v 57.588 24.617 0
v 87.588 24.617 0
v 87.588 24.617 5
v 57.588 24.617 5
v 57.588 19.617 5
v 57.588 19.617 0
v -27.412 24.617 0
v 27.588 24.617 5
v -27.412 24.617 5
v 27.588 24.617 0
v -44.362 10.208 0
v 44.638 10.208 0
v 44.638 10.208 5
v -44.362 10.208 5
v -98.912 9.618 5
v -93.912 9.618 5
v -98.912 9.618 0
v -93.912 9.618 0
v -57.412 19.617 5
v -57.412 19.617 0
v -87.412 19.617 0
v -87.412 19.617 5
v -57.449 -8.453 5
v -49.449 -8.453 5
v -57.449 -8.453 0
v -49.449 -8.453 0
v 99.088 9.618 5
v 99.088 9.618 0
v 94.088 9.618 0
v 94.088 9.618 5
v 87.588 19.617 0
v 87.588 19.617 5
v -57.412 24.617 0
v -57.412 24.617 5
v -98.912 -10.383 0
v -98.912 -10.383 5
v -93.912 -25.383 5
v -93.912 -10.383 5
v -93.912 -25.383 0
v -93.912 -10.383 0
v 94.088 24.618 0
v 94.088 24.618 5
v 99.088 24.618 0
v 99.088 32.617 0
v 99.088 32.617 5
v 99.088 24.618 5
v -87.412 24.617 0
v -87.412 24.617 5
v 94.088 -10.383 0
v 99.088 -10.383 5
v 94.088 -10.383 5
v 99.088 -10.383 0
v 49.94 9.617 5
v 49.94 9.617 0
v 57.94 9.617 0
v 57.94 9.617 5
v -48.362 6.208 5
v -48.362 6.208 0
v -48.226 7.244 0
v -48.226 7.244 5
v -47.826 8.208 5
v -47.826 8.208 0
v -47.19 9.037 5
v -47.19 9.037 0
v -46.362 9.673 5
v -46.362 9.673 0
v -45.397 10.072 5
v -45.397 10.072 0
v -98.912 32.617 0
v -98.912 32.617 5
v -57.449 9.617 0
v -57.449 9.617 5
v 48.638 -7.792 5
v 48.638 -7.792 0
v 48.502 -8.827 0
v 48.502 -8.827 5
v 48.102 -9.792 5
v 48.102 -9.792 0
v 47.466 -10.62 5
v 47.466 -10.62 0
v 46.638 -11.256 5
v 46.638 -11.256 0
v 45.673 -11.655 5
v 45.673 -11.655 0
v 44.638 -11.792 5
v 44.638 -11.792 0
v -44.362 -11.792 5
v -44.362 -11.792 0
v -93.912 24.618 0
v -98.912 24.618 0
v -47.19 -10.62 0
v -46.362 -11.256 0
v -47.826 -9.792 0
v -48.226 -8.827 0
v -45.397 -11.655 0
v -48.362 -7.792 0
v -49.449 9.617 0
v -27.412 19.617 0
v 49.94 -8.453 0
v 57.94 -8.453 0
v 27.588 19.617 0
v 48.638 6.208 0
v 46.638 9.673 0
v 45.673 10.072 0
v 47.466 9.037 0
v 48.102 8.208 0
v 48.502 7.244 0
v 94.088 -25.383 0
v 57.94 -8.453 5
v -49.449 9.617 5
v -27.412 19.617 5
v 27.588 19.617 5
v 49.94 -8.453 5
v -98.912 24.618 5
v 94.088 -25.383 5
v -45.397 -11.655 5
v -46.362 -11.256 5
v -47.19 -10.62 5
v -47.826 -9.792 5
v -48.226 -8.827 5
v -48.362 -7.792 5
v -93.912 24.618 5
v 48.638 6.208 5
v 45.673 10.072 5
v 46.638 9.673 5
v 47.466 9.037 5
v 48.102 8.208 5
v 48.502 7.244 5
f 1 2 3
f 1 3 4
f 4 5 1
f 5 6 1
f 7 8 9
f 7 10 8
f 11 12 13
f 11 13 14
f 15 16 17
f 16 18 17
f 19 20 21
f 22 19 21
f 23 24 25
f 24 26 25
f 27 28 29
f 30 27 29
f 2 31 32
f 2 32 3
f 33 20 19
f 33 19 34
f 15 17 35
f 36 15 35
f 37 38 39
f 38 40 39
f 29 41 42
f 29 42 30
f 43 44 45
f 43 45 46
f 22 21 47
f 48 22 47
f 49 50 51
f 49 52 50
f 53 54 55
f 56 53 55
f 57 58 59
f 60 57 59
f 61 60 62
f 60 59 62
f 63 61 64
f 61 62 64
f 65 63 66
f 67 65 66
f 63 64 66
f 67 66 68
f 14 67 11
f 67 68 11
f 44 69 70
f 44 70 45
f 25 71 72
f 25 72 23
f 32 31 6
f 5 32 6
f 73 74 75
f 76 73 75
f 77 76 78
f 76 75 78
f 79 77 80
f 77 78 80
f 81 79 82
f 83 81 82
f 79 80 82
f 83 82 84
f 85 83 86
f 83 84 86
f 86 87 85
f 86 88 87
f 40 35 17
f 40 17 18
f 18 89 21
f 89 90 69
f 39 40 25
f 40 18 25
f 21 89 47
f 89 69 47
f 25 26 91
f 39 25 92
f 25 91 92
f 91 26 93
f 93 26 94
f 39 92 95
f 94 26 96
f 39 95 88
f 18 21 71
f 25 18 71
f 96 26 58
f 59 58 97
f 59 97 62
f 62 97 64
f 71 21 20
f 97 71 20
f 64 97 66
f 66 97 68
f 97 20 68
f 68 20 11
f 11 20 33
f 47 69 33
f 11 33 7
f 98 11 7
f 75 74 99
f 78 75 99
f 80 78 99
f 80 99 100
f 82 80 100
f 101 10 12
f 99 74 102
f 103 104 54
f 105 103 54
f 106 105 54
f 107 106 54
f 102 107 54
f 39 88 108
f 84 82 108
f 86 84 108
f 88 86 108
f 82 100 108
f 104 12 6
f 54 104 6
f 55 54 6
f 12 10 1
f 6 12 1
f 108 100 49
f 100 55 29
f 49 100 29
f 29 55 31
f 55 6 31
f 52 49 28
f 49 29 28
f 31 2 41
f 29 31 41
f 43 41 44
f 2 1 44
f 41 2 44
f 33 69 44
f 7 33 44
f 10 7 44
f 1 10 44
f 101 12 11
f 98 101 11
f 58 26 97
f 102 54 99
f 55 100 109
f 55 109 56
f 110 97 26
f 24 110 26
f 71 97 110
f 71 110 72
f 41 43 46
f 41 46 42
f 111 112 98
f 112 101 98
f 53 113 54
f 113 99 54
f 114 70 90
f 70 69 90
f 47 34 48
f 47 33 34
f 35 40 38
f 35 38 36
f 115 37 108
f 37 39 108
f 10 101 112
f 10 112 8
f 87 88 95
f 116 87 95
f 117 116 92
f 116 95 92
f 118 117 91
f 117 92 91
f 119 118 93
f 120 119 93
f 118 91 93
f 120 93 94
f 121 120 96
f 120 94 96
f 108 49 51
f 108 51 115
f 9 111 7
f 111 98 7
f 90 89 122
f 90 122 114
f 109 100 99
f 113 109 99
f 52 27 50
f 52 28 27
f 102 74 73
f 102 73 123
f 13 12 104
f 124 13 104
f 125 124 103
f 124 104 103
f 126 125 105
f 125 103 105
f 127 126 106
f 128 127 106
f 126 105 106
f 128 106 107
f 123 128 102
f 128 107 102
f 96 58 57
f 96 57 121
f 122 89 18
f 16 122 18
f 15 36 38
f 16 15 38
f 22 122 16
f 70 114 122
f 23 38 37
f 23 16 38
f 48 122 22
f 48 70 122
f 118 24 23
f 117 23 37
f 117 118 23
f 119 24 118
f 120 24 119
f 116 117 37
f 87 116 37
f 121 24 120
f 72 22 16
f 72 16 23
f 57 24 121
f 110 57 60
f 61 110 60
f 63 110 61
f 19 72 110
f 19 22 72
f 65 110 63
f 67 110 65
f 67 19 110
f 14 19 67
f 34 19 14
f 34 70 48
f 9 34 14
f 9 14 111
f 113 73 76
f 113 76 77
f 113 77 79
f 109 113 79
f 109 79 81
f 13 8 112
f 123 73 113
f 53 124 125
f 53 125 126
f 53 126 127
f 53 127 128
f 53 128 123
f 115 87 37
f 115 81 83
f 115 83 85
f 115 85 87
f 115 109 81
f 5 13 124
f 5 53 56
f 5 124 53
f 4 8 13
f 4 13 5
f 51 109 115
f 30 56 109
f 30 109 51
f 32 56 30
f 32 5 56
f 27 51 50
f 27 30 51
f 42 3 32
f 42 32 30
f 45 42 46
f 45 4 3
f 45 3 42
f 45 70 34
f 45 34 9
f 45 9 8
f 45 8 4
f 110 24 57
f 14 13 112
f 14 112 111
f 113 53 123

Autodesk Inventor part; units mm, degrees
ref_plane "YZ Plane" through (0, 0, 0) normal (1, 0, 0) x (0, 1, 0)
ref_plane "XZ Plane" through (0, 0, 0) normal (0, 1, 0) x (-1, 0, 0)
ref_plane "XY Plane" through (0, 0, 0) normal (0, 0, 1) x (1, 0, 0)
sketch "Sketch1" plane through (0, 0, 0) normal (0, 0, 1) x (1, 0, 0)
  line L0 (49.9396, 9.6174) -> (57.9396, 9.6174)
  line L1 (57.9396, -8.4526) -> (49.9396, -8.4526)
  line L2 (49.9396, -8.4526) -> (49.9396, 9.6174)
  line L3 (57.9396, -8.4526) -> (57.9396, 9.6174)
  line L4 (-49.449, 9.6174) -> (-49.449, -8.4526)
  line L5 (-49.449, -8.4526) -> (-57.449, -8.4526)
  line L6 (-57.449, 9.6174) -> (-57.449, -8.4526)
  line L7 (-45.5464, 0.7392) -> (-34.5464, 0.7392)
  line L8 (-33.5464, 1.7392) -> (-33.5464, 6.2392)
  line L9 (-34.5464, 7.2392) -> (-45.5464, 7.2392)
  line L10 (-46.5464, 6.2392) -> (-46.5464, 1.7392)
  line L11 (-30.5291, -2.0275) -> (3.4709, -2.0275)
  line L12 (4.4709, -1.0275) -> (4.4709, 3.9725)
  line L13 (-31.5291, 3.9725) -> (-31.5291, -1.0275)
  circle A0 centre (-88.9996, -15.383) radius 1.5
  circle A1 centre (-64.9996, -15.383) radius 1.5
  circle A2 centre (-64.9996, 8.617) radius 1.5
  circle A3 centre (-88.9996, 8.617) radius 1.5
  arc A4 (-82.1595, 3.0543) -> (-82.1595, -9.8202) centre (-76.9996, -3.383) ccw
  arc A5 (-79.9944, -11.0702) -> (-68.8448, -4.633) centre (-76.9996, -3.383) ccw
  arc A6 (-68.8448, -2.133) -> (-79.9944, 4.3043) centre (-76.9996, -3.383) ccw
  arc A7 (-82.0034, -16.8856) -> (-62.804, -5.8009) centre (-76.9996, -3.383) ccw
  arc A8 (-63.7898, -2.133) -> (-62.804, -0.9651) centre (-63.7898, -1.133) ccw
  arc A9 (-62.804, -0.9651) -> (-82.0034, 10.1197) centre (-76.9996, -3.383) ccw
  arc A10 (-82.0034, 10.1197) -> (-82.5219, 8.682) centre (-81.6559, 9.182) ccw
  line L14 (-82.5219, 8.682) -> (-79.9944, 4.3043)
  line L15 (-82.1595, 3.0543) -> (-84.687, 7.432)
  arc A11 (-84.687, 7.432) -> (-86.1913, 7.7018) centre (-85.553, 6.932) ccw
  arc A12 (-86.1913, 7.7018) -> (-86.1913, -14.4677) centre (-76.9996, -3.383) ccw
  arc A13 (-86.1913, -14.4677) -> (-84.687, -14.1979) centre (-85.553, -13.6979) ccw
  line L16 (-84.687, -14.1979) -> (-82.1595, -9.8202)
  arc A14 (-82.5219, -15.4479) -> (-82.0034, -16.8856) centre (-81.6559, -15.9479) ccw
  line L17 (-79.9944, -11.0702) -> (-82.5219, -15.4479)
  line L18 (-63.7898, -4.633) -> (-68.8448, -4.633)
  arc A15 (-62.804, -5.8009) -> (-63.7898, -4.633) centre (-63.7898, -5.633) ccw
  line L19 (-68.8448, -2.133) -> (-63.7898, -2.133)
  circle A16 centre (64.9975, -15.3839) radius 1.5
  circle A17 centre (88.9975, -15.3839) radius 1.5
  circle A18 centre (88.9975, 8.6161) radius 1.5
  circle A19 centre (64.9975, 8.6161) radius 1.5
  line L20 (71.4751, 8.6811) -> (74.0026, 4.3033)
  arc A20 (71.9936, 10.1188) -> (71.4751, 8.6811) centre (72.3411, 9.1811) ccw
  arc A21 (91.193, -0.966) -> (71.9936, 10.1188) centre (76.9975, -3.3839) ccw
  arc A22 (85.1522, -2.1339) -> (74.0026, 4.3033) centre (76.9975, -3.3839) ccw
  line L21 (85.1522, -2.1339) -> (90.2072, -2.1339)
  arc A23 (90.2072, -2.1339) -> (91.193, -0.966) centre (90.2072, -1.1339) ccw
  arc A24 (91.193, -5.8018) -> (90.2072, -4.6339) centre (90.2072, -5.6339) ccw
  arc A25 (71.9936, -16.8866) -> (91.193, -5.8018) centre (76.9975, -3.3839) ccw
  arc A26 (74.0026, -11.0711) -> (85.1522, -4.6339) centre (76.9975, -3.3839) ccw
  line L22 (74.0026, -11.0711) -> (71.4751, -15.4489)
  line L23 (69.31, -14.1989) -> (71.8375, -9.8211)
  arc A27 (67.8057, -14.4686) -> (69.31, -14.1989) centre (68.444, -13.6989) ccw
  arc A28 (67.8057, 7.7009) -> (67.8057, -14.4686) centre (76.9975, -3.3839) ccw
  arc A29 (71.8375, 3.0533) -> (71.8375, -9.8211) centre (76.9975, -3.3839) ccw
  line L24 (71.8375, 3.0533) -> (69.31, 7.4311)
  arc A30 (69.31, 7.4311) -> (67.8057, 7.7009) centre (68.444, 6.9311) ccw
  arc A31 (71.4751, -15.4489) -> (71.9936, -16.8866) centre (72.3411, -15.9489) ccw
  line L25 (90.2072, -4.6339) -> (85.1522, -4.6339)
  line L26 (-49.449, 9.6174) -> (-57.449, 9.6174)
  line L27 (3.4709, 4.9725) -> (-30.5291, 4.9725)
  arc A32 (-34.5464, 0.7392) -> (-33.5464, 1.7392) centre (-34.5464, 1.7392) ccw
  arc A33 (-33.5464, 6.2392) -> (-34.5464, 7.2392) centre (-34.5464, 6.2392) ccw
  arc A34 (-45.5464, 7.2392) -> (-46.5464, 6.2392) centre (-45.5464, 6.2392) ccw
  arc A35 (-46.5464, 1.7392) -> (-45.5464, 0.7392) centre (-45.5464, 1.7392) ccw
  arc A36 (-31.5291, -1.0275) -> (-30.5291, -2.0275) centre (-30.5291, -1.0275) ccw
  arc A37 (-30.5291, 4.9725) -> (-31.5291, 3.9725) centre (-30.5291, 3.9725) ccw
  arc A38 (4.4709, 3.9725) -> (3.4709, 4.9725) centre (3.4709, 3.9725) ccw
  arc A39 (3.4709, -2.0275) -> (4.4709, -1.0275) centre (3.4709, -1.0275) ccw
  line L28 (-57.412, 19.6174) -> (-87.412, 19.6174) projected
  line L29 (-87.412, 19.6174) -> (-87.412, 24.6174) projected
  line L30 (-57.412, 24.6174) -> (-87.412, 24.6174) projected
  line L31 (-57.412, 19.6174) -> (-57.412, 24.6174) projected
  line L32 (27.588, 19.6174) -> (-27.412, 19.6174) projected
  line L33 (-27.412, 19.6174) -> (-27.412, 24.6174) projected
  line L34 (27.588, 24.6174) -> (-27.412, 24.6174) projected
  line L35 (27.588, 19.6174) -> (27.588, 24.6174) projected
  line L36 (87.588, 19.6174) -> (57.588, 19.6174) projected
  line L37 (57.588, 19.6174) -> (57.588, 24.6174) projected
  line L38 (87.588, 24.6174) -> (57.588, 24.6174) projected
  line L39 (87.588, 19.6174) -> (87.588, 24.6174) projected
  line L40 (94.088, -10.3826) -> (94.088, -25.3826) projected
  line L41 (99.088, -10.3826) -> (94.088, -10.3826) projected
  line L42 (99.088, 9.6181) -> (99.088, -10.3826) projected
  line L43 (99.088, 9.6181) -> (94.088, 9.6181) projected
  line L44 (94.088, 24.6181) -> (94.088, 9.6181) projected
  line L45 (99.088, 24.6181) -> (94.088, 24.6181) projected
  line L46 (99.088, 32.6174) -> (99.088, 24.6181) projected
  line L47 (-98.912, 32.6174) -> (-98.912, 24.6181) projected
  line L48 (-93.912, 24.6181) -> (-98.912, 24.6181) projected
  line L49 (-93.912, 24.6181) -> (-93.912, 9.6181) projected
  line L50 (-93.912, 9.6181) -> (-98.912, 9.6181) projected
  line L51 (-98.912, 9.6181) -> (-98.912, -10.3826) projected
  line L52 (-93.912, -10.3826) -> (-98.912, -10.3826) projected
  line L53 (-93.912, -10.3826) -> (-93.912, -25.3826) projected
  line L54 (-98.912, 32.6174) -> (99.088, 32.6174)
  line L55 (-93.912, -25.3826) -> (94.088, -25.3826)
  arc A40 (15.5314, -3.6707) -> (16.5314, -2.6707) centre (15.5314, -2.6707) ccw
  arc A41 (16.5314, 5.8293) -> (15.5314, 6.8293) centre (15.5314, 5.8293) ccw
  line L56 (5.7314, -2.6707) -> (5.7314, 5.8293)
  arc A42 (5.7314, -2.6707) -> (6.7314, -3.6707) centre (6.7314, -2.6707) ccw
  arc A43 (6.7314, 6.8293) -> (5.7314, 5.8293) centre (6.7314, 5.8293) ccw
  line L57 (6.7314, 6.8293) -> (15.5314, 6.8293)
  line L58 (6.7314, -3.6707) -> (15.5314, -3.6707)
  line L59 (23.4252, 0.4179) -> (23.4252, -9.0821)
  line L60 (37.4252, 1.4179) -> (24.4252, 1.4179)
  line L61 (24.4252, -10.0821) -> (37.4252, -10.0821)
  line L62 (38.4252, -9.0821) -> (38.4252, 0.4179)
  line L63 (16.5314, -2.6707) -> (16.5314, 5.8293)
  arc A44 (24.4252, 1.4179) -> (23.4252, 0.4179) centre (24.4252, 0.4179) ccw
  arc A45 (23.4252, -9.0821) -> (24.4252, -10.0821) centre (24.4252, -9.0821) ccw
  arc A46 (37.4252, -10.0821) -> (38.4252, -9.0821) centre (37.4252, -9.0821) ccw
  arc A47 (38.4252, 0.4179) -> (37.4252, 1.4179) centre (37.4252, 0.4179) ccw
  point P0 (-50.5662, -19.8134)
  point P1 (94.0004, -33.3808)
  point P2 (-46.5464, 0.7392)
  point P3 (-33.5464, 7.2392)
  point P4 (-33.5464, 0.7392)
  point P5 (-46.5464, 7.2392)
  point P6 (-31.5291, -2.0275)
  point P7 (4.4709, 4.9725)
  point P8 (4.4709, -2.0275)
  point P9 (-31.5291, 4.9725)
  point P10 (3.4709, -1.0275)
  point P11 (23.4252, 1.4179)
  point P12 (5.7314, -3.6707)
  point P13 (16.5314, 6.8293)
  point P14 (16.5314, -3.6707)
  point P15 (23.4252, -10.0821)
  point P16 (38.4252, -10.0821)
  point P17 (38.4252, 1.4179)
  dimension "d20" = 8
  dimension "d47" = 8
  dimension "d53" = 6.5
  dimension "d54" = 13
  dimension "d56" = 36
  dimension "d59" = 1
  dimension "d60" = 7
  dimension "d73" = 10.5
  dimension "d74" = 10.8
  dimension "d75" = 11.5
  dimension "d76" = 15
extrude "Extrusion2" add sketch "Sketch1" along normal blind 5
sketch "Sketch2" plane through (0, 0, 0) normal (0, 0, -1) x (-1, 0, 0)
  line L0 (92.3846, -19.3253) -> (61.6146, -19.3253)
  line L1 (61.6146, -19.3253) -> (61.6146, 12.5593)
  line L2 (61.6146, 12.5593) -> (92.3846, 12.5593)
  line L3 (92.3846, 12.5593) -> (92.3846, -19.3253)
  arc A0 (82.1595, -9.8202) -> (82.1595, 3.0543) centre (76.9996, -3.383) ccw projected
  line L4 (92.3846, -19.3253) -> (61.6146, 12.5593) construction
  line L5 (61.6146, -19.3253) -> (92.3846, 12.5593) construction
  line L6 (-61.3514, -21.1002) -> (-92.6435, -21.1002)
  line L7 (-92.6435, -21.1002) -> (-92.6435, 14.3324)
  line L8 (-92.6435, 14.3324) -> (-61.3514, 14.3324)
  line L9 (-61.3514, 14.3324) -> (-61.3514, -21.1002)
  arc A1 (-67.8057, -14.4686) -> (-67.8057, 7.7009) centre (-76.9975, -3.3839) ccw projected
  line L10 (-61.3514, -21.1002) -> (-92.6435, 14.3324) construction
  line L11 (-92.6435, -21.1002) -> (-61.3514, 14.3324) construction
  point P0 (0, 0)
extrude "Extrusion3" add sketch "Sketch2" against normal blind 5
sketch "Sketch3" plane through (0, 0, 0) normal (0, 0, -1) x (-1, 0, 0)
  line L0 (44.362, -11.7916) -> (-44.638, -11.7916)
  line L1 (-48.638, -7.7916) -> (-48.638, 6.2084)
  line L2 (-44.638, 10.2084) -> (44.362, 10.2084)
  line L3 (48.362, 6.2084) -> (48.362, -7.7916)
  line L4 (48.362, -11.7916) -> (-48.638, 10.2084) construction
  line L5 (-48.638, -11.7916) -> (48.362, 10.2084) construction
  arc A0 (44.362, -11.7916) -> (48.362, -7.7916) centre (44.362, -7.7916) ccw
  arc A1 (-48.638, -7.7916) -> (-44.638, -11.7916) centre (-44.638, -7.7916) ccw
  arc A2 (-44.638, 10.2084) -> (-48.638, 6.2084) centre (-44.638, 6.2084) ccw
  arc A3 (48.362, 6.2084) -> (44.362, 10.2084) centre (44.362, 6.2084) ccw
  line L6 (-99.088, -10.3826) -> (-99.088, 9.6181) projected
  line L7 (-99.088, 32.6174) -> (98.912, 32.6174) projected
  line L8 (98.912, 9.6181) -> (98.912, -10.3826) projected
  point P0 (0, 0)
  point P1 (-0.138, -0.7916)
  point P2 (-48.638, -0.7916)
  dimension "d79" = 97
  dimension "d80" = 22
  dimension "d81" = 4
  dimension "d83" = 22.409
  dimension "d84" = 50.55
extrude "Extrusion4" cut sketch "Sketch3" against normal blind 5
properties part number "case top back" material "Lead"
